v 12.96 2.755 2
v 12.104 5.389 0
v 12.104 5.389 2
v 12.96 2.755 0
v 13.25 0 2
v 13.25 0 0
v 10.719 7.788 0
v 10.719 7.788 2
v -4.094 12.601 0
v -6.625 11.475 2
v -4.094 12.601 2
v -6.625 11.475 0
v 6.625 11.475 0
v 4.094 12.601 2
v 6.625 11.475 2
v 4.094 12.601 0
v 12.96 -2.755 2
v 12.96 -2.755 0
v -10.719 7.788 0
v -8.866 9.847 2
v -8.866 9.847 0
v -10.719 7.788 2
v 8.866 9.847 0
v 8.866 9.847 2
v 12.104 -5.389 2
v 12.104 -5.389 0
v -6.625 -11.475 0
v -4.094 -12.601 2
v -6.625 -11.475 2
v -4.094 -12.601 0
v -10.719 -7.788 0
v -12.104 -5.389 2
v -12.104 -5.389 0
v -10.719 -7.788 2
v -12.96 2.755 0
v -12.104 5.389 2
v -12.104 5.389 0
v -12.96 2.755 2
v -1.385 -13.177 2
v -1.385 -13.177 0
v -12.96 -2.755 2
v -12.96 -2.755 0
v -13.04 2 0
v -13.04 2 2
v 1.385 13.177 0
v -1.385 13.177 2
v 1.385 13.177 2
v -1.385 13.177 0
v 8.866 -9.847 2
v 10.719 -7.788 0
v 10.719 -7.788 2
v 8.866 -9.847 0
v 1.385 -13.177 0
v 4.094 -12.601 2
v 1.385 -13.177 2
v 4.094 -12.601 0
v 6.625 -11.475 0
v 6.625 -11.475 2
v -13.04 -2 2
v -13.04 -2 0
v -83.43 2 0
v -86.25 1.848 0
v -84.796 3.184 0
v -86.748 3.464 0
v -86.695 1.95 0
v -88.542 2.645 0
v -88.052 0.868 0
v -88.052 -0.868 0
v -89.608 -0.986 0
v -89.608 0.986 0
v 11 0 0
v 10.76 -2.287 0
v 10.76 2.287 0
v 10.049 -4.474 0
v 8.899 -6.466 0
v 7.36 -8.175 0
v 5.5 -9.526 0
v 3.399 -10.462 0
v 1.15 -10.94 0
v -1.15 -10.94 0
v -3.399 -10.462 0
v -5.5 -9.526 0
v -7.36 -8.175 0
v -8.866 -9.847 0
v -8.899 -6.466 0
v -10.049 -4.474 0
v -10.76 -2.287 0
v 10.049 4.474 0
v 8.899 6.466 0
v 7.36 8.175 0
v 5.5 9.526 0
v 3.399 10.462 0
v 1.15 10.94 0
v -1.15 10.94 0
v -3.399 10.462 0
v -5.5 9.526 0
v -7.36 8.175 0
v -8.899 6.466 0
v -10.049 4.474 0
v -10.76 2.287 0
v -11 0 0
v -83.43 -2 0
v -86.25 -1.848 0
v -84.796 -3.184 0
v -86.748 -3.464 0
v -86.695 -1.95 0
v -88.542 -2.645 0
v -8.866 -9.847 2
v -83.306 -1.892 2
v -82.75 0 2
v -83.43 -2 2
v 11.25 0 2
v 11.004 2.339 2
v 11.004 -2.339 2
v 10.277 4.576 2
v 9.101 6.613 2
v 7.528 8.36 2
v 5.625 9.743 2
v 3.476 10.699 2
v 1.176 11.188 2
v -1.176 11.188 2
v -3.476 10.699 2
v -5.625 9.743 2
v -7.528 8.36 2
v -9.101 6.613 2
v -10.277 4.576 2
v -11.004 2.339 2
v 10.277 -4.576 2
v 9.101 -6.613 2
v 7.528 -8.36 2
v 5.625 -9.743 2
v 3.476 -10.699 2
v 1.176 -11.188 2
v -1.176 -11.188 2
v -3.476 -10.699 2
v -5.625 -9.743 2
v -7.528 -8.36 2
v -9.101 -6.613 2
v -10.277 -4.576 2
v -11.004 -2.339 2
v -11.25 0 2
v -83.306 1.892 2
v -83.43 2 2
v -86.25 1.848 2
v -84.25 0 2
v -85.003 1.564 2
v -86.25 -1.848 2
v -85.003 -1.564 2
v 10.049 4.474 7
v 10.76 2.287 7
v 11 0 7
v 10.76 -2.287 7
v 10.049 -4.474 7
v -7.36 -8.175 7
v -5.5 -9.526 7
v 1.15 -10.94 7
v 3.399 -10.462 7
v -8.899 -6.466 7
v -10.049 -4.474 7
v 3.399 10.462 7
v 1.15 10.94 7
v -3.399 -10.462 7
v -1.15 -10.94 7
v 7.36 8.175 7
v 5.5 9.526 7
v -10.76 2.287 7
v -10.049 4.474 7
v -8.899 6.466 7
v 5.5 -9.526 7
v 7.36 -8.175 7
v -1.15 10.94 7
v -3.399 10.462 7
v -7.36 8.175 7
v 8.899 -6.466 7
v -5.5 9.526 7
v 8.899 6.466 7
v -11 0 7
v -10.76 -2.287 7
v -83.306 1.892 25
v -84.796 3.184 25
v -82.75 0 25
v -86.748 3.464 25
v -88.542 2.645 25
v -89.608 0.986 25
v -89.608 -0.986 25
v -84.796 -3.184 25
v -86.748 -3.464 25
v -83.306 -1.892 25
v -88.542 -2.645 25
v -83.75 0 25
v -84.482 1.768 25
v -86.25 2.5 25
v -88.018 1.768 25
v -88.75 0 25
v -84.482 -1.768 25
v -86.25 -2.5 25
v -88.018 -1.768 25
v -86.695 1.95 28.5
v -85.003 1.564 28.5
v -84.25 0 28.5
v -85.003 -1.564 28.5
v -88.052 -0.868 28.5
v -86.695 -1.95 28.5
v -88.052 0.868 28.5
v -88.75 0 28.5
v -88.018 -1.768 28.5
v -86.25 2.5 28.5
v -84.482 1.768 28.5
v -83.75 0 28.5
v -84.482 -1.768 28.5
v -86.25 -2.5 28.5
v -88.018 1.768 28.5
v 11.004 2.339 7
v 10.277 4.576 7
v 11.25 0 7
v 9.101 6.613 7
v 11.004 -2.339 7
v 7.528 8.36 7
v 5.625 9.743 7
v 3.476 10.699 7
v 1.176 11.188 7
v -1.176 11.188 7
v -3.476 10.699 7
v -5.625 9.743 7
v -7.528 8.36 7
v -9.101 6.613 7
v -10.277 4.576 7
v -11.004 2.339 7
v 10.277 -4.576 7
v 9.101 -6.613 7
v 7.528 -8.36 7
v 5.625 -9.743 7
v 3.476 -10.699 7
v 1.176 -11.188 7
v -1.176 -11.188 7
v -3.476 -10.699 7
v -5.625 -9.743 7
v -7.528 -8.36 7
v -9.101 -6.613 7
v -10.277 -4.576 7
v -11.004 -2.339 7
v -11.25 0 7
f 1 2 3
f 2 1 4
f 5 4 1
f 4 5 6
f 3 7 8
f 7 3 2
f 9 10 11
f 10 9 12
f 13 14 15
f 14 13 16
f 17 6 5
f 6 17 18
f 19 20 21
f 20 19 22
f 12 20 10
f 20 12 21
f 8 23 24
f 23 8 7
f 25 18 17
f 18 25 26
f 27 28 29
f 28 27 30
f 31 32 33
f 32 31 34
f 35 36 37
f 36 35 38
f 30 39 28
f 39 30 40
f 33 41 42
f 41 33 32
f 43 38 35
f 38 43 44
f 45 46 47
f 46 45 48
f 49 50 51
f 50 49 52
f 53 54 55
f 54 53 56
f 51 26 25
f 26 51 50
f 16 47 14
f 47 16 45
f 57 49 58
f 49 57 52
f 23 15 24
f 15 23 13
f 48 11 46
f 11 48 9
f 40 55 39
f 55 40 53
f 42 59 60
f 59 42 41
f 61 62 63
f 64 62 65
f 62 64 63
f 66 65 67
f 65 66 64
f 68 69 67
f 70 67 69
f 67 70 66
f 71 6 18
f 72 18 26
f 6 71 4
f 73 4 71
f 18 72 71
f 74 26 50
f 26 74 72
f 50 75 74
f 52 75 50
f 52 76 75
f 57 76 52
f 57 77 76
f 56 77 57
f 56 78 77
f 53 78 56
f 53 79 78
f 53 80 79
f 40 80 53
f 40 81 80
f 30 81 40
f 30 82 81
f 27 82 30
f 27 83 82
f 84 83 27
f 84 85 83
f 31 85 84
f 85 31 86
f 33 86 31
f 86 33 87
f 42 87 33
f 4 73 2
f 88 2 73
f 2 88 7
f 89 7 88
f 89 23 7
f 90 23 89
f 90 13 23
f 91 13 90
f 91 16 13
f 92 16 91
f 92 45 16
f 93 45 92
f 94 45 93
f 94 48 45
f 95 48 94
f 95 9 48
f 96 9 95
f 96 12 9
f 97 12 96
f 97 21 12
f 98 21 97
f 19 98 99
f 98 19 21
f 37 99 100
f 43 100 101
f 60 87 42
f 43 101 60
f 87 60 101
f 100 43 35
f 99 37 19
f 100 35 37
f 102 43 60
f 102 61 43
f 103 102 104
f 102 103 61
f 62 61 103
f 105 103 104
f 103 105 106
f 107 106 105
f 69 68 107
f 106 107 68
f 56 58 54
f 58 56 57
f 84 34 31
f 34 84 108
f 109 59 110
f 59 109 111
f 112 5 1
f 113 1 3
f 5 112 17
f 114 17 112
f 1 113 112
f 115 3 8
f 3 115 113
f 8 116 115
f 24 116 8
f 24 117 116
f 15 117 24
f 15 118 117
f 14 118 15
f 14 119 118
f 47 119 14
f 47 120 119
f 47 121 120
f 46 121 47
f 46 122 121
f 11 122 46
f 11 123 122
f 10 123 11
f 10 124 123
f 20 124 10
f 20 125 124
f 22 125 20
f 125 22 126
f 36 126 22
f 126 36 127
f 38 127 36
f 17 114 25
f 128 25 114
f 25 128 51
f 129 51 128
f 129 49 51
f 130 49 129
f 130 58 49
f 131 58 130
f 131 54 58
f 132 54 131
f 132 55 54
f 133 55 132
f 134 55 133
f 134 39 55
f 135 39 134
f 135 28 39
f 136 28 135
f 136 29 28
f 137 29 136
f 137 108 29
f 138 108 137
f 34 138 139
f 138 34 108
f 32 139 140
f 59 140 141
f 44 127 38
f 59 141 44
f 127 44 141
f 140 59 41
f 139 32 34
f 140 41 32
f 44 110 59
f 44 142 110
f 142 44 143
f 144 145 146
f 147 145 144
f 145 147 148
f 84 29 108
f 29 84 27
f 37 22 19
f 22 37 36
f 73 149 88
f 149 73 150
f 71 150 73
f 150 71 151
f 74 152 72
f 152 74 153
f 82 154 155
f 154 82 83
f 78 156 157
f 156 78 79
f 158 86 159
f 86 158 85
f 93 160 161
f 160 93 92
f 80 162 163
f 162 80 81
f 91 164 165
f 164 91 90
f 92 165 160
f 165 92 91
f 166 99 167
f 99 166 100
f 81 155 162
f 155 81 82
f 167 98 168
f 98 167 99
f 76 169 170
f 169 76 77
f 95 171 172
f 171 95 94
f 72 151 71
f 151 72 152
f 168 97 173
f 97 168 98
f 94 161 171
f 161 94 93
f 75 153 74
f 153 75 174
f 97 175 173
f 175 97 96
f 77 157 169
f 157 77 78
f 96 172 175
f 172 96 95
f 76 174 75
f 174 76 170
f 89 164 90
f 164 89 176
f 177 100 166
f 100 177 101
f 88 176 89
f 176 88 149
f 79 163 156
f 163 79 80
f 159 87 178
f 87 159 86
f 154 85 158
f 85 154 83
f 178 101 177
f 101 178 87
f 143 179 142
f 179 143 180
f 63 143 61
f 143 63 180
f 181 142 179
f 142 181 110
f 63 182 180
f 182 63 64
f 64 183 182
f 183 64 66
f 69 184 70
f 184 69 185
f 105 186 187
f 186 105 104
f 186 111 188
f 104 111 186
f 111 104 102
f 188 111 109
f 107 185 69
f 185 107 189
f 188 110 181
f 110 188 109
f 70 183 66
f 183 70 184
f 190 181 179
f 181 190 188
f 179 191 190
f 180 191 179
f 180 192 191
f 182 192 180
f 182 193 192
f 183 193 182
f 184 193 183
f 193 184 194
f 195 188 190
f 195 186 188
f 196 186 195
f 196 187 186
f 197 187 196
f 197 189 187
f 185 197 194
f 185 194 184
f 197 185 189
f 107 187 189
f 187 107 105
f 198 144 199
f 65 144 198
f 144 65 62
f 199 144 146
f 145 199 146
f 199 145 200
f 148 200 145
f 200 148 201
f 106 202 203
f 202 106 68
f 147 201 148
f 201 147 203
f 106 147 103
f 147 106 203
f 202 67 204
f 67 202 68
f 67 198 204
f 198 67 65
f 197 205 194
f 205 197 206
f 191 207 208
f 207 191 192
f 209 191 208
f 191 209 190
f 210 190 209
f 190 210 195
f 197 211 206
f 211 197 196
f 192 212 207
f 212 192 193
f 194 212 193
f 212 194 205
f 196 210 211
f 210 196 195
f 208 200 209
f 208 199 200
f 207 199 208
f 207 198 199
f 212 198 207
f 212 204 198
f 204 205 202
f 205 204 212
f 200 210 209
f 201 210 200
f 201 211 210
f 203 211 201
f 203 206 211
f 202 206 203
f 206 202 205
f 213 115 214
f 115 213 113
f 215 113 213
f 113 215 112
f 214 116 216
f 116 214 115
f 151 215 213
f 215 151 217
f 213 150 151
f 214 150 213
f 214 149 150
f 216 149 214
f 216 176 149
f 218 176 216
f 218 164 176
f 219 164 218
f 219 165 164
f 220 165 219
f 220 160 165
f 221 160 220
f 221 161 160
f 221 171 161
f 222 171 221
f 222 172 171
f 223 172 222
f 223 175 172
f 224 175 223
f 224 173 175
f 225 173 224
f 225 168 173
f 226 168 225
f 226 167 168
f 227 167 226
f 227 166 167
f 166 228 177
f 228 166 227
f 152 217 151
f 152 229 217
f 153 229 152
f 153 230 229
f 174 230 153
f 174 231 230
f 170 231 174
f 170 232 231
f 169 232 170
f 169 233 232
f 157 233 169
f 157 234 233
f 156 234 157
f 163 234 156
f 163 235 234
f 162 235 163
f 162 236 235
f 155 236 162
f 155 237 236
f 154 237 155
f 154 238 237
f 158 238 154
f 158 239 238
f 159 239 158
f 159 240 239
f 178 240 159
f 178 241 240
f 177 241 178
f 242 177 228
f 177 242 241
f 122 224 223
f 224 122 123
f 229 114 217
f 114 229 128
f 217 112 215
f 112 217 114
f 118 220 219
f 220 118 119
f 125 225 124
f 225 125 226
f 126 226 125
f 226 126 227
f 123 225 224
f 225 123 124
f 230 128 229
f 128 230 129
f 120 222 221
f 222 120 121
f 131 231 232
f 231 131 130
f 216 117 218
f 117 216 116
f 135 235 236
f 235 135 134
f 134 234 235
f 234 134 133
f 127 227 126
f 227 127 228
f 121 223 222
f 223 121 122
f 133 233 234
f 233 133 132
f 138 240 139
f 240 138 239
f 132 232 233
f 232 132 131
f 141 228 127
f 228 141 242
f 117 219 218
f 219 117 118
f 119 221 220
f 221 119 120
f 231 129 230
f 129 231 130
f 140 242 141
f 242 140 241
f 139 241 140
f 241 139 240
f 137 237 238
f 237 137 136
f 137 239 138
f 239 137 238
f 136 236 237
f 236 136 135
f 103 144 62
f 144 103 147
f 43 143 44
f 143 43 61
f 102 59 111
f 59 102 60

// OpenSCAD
union() {
	difference() {
		cylinder(d = 26.5000000000, h = 2);
		translate(v = [0, 0, -2]) {
			cylinder(d = 22, h = 4);
		}
	}
	translate(v = [-48.7500000000, 0, 0]) {
		translate(v = [0, 0, 1.0000000000]) {
			cube(center = true, size = [75, 4, 2]);
		}
	}
	translate(v = [-86.2500000000, 0, 0]) {
		union() {
			difference() {
				cylinder(d = 7, h = 25);
				translate(v = [0, 0, -25]) {
					cylinder(d = 4, h = 50);
				}
			}
			translate(v = [0, 0, 25]) {
				difference() {
					cylinder(d = 5, h = 3.5000000000);
					translate(v = [0, 0, -3.5000000000]) {
						cylinder(d = 4, h = 7.0000000000);
					}
				}
			}
		}
	}
	difference() {
		cylinder(d = 22.5000000000, h = 7);
		translate(v = [0, 0, -7]) {
			cylinder(d = 22, h = 14);
		}
	}
}
